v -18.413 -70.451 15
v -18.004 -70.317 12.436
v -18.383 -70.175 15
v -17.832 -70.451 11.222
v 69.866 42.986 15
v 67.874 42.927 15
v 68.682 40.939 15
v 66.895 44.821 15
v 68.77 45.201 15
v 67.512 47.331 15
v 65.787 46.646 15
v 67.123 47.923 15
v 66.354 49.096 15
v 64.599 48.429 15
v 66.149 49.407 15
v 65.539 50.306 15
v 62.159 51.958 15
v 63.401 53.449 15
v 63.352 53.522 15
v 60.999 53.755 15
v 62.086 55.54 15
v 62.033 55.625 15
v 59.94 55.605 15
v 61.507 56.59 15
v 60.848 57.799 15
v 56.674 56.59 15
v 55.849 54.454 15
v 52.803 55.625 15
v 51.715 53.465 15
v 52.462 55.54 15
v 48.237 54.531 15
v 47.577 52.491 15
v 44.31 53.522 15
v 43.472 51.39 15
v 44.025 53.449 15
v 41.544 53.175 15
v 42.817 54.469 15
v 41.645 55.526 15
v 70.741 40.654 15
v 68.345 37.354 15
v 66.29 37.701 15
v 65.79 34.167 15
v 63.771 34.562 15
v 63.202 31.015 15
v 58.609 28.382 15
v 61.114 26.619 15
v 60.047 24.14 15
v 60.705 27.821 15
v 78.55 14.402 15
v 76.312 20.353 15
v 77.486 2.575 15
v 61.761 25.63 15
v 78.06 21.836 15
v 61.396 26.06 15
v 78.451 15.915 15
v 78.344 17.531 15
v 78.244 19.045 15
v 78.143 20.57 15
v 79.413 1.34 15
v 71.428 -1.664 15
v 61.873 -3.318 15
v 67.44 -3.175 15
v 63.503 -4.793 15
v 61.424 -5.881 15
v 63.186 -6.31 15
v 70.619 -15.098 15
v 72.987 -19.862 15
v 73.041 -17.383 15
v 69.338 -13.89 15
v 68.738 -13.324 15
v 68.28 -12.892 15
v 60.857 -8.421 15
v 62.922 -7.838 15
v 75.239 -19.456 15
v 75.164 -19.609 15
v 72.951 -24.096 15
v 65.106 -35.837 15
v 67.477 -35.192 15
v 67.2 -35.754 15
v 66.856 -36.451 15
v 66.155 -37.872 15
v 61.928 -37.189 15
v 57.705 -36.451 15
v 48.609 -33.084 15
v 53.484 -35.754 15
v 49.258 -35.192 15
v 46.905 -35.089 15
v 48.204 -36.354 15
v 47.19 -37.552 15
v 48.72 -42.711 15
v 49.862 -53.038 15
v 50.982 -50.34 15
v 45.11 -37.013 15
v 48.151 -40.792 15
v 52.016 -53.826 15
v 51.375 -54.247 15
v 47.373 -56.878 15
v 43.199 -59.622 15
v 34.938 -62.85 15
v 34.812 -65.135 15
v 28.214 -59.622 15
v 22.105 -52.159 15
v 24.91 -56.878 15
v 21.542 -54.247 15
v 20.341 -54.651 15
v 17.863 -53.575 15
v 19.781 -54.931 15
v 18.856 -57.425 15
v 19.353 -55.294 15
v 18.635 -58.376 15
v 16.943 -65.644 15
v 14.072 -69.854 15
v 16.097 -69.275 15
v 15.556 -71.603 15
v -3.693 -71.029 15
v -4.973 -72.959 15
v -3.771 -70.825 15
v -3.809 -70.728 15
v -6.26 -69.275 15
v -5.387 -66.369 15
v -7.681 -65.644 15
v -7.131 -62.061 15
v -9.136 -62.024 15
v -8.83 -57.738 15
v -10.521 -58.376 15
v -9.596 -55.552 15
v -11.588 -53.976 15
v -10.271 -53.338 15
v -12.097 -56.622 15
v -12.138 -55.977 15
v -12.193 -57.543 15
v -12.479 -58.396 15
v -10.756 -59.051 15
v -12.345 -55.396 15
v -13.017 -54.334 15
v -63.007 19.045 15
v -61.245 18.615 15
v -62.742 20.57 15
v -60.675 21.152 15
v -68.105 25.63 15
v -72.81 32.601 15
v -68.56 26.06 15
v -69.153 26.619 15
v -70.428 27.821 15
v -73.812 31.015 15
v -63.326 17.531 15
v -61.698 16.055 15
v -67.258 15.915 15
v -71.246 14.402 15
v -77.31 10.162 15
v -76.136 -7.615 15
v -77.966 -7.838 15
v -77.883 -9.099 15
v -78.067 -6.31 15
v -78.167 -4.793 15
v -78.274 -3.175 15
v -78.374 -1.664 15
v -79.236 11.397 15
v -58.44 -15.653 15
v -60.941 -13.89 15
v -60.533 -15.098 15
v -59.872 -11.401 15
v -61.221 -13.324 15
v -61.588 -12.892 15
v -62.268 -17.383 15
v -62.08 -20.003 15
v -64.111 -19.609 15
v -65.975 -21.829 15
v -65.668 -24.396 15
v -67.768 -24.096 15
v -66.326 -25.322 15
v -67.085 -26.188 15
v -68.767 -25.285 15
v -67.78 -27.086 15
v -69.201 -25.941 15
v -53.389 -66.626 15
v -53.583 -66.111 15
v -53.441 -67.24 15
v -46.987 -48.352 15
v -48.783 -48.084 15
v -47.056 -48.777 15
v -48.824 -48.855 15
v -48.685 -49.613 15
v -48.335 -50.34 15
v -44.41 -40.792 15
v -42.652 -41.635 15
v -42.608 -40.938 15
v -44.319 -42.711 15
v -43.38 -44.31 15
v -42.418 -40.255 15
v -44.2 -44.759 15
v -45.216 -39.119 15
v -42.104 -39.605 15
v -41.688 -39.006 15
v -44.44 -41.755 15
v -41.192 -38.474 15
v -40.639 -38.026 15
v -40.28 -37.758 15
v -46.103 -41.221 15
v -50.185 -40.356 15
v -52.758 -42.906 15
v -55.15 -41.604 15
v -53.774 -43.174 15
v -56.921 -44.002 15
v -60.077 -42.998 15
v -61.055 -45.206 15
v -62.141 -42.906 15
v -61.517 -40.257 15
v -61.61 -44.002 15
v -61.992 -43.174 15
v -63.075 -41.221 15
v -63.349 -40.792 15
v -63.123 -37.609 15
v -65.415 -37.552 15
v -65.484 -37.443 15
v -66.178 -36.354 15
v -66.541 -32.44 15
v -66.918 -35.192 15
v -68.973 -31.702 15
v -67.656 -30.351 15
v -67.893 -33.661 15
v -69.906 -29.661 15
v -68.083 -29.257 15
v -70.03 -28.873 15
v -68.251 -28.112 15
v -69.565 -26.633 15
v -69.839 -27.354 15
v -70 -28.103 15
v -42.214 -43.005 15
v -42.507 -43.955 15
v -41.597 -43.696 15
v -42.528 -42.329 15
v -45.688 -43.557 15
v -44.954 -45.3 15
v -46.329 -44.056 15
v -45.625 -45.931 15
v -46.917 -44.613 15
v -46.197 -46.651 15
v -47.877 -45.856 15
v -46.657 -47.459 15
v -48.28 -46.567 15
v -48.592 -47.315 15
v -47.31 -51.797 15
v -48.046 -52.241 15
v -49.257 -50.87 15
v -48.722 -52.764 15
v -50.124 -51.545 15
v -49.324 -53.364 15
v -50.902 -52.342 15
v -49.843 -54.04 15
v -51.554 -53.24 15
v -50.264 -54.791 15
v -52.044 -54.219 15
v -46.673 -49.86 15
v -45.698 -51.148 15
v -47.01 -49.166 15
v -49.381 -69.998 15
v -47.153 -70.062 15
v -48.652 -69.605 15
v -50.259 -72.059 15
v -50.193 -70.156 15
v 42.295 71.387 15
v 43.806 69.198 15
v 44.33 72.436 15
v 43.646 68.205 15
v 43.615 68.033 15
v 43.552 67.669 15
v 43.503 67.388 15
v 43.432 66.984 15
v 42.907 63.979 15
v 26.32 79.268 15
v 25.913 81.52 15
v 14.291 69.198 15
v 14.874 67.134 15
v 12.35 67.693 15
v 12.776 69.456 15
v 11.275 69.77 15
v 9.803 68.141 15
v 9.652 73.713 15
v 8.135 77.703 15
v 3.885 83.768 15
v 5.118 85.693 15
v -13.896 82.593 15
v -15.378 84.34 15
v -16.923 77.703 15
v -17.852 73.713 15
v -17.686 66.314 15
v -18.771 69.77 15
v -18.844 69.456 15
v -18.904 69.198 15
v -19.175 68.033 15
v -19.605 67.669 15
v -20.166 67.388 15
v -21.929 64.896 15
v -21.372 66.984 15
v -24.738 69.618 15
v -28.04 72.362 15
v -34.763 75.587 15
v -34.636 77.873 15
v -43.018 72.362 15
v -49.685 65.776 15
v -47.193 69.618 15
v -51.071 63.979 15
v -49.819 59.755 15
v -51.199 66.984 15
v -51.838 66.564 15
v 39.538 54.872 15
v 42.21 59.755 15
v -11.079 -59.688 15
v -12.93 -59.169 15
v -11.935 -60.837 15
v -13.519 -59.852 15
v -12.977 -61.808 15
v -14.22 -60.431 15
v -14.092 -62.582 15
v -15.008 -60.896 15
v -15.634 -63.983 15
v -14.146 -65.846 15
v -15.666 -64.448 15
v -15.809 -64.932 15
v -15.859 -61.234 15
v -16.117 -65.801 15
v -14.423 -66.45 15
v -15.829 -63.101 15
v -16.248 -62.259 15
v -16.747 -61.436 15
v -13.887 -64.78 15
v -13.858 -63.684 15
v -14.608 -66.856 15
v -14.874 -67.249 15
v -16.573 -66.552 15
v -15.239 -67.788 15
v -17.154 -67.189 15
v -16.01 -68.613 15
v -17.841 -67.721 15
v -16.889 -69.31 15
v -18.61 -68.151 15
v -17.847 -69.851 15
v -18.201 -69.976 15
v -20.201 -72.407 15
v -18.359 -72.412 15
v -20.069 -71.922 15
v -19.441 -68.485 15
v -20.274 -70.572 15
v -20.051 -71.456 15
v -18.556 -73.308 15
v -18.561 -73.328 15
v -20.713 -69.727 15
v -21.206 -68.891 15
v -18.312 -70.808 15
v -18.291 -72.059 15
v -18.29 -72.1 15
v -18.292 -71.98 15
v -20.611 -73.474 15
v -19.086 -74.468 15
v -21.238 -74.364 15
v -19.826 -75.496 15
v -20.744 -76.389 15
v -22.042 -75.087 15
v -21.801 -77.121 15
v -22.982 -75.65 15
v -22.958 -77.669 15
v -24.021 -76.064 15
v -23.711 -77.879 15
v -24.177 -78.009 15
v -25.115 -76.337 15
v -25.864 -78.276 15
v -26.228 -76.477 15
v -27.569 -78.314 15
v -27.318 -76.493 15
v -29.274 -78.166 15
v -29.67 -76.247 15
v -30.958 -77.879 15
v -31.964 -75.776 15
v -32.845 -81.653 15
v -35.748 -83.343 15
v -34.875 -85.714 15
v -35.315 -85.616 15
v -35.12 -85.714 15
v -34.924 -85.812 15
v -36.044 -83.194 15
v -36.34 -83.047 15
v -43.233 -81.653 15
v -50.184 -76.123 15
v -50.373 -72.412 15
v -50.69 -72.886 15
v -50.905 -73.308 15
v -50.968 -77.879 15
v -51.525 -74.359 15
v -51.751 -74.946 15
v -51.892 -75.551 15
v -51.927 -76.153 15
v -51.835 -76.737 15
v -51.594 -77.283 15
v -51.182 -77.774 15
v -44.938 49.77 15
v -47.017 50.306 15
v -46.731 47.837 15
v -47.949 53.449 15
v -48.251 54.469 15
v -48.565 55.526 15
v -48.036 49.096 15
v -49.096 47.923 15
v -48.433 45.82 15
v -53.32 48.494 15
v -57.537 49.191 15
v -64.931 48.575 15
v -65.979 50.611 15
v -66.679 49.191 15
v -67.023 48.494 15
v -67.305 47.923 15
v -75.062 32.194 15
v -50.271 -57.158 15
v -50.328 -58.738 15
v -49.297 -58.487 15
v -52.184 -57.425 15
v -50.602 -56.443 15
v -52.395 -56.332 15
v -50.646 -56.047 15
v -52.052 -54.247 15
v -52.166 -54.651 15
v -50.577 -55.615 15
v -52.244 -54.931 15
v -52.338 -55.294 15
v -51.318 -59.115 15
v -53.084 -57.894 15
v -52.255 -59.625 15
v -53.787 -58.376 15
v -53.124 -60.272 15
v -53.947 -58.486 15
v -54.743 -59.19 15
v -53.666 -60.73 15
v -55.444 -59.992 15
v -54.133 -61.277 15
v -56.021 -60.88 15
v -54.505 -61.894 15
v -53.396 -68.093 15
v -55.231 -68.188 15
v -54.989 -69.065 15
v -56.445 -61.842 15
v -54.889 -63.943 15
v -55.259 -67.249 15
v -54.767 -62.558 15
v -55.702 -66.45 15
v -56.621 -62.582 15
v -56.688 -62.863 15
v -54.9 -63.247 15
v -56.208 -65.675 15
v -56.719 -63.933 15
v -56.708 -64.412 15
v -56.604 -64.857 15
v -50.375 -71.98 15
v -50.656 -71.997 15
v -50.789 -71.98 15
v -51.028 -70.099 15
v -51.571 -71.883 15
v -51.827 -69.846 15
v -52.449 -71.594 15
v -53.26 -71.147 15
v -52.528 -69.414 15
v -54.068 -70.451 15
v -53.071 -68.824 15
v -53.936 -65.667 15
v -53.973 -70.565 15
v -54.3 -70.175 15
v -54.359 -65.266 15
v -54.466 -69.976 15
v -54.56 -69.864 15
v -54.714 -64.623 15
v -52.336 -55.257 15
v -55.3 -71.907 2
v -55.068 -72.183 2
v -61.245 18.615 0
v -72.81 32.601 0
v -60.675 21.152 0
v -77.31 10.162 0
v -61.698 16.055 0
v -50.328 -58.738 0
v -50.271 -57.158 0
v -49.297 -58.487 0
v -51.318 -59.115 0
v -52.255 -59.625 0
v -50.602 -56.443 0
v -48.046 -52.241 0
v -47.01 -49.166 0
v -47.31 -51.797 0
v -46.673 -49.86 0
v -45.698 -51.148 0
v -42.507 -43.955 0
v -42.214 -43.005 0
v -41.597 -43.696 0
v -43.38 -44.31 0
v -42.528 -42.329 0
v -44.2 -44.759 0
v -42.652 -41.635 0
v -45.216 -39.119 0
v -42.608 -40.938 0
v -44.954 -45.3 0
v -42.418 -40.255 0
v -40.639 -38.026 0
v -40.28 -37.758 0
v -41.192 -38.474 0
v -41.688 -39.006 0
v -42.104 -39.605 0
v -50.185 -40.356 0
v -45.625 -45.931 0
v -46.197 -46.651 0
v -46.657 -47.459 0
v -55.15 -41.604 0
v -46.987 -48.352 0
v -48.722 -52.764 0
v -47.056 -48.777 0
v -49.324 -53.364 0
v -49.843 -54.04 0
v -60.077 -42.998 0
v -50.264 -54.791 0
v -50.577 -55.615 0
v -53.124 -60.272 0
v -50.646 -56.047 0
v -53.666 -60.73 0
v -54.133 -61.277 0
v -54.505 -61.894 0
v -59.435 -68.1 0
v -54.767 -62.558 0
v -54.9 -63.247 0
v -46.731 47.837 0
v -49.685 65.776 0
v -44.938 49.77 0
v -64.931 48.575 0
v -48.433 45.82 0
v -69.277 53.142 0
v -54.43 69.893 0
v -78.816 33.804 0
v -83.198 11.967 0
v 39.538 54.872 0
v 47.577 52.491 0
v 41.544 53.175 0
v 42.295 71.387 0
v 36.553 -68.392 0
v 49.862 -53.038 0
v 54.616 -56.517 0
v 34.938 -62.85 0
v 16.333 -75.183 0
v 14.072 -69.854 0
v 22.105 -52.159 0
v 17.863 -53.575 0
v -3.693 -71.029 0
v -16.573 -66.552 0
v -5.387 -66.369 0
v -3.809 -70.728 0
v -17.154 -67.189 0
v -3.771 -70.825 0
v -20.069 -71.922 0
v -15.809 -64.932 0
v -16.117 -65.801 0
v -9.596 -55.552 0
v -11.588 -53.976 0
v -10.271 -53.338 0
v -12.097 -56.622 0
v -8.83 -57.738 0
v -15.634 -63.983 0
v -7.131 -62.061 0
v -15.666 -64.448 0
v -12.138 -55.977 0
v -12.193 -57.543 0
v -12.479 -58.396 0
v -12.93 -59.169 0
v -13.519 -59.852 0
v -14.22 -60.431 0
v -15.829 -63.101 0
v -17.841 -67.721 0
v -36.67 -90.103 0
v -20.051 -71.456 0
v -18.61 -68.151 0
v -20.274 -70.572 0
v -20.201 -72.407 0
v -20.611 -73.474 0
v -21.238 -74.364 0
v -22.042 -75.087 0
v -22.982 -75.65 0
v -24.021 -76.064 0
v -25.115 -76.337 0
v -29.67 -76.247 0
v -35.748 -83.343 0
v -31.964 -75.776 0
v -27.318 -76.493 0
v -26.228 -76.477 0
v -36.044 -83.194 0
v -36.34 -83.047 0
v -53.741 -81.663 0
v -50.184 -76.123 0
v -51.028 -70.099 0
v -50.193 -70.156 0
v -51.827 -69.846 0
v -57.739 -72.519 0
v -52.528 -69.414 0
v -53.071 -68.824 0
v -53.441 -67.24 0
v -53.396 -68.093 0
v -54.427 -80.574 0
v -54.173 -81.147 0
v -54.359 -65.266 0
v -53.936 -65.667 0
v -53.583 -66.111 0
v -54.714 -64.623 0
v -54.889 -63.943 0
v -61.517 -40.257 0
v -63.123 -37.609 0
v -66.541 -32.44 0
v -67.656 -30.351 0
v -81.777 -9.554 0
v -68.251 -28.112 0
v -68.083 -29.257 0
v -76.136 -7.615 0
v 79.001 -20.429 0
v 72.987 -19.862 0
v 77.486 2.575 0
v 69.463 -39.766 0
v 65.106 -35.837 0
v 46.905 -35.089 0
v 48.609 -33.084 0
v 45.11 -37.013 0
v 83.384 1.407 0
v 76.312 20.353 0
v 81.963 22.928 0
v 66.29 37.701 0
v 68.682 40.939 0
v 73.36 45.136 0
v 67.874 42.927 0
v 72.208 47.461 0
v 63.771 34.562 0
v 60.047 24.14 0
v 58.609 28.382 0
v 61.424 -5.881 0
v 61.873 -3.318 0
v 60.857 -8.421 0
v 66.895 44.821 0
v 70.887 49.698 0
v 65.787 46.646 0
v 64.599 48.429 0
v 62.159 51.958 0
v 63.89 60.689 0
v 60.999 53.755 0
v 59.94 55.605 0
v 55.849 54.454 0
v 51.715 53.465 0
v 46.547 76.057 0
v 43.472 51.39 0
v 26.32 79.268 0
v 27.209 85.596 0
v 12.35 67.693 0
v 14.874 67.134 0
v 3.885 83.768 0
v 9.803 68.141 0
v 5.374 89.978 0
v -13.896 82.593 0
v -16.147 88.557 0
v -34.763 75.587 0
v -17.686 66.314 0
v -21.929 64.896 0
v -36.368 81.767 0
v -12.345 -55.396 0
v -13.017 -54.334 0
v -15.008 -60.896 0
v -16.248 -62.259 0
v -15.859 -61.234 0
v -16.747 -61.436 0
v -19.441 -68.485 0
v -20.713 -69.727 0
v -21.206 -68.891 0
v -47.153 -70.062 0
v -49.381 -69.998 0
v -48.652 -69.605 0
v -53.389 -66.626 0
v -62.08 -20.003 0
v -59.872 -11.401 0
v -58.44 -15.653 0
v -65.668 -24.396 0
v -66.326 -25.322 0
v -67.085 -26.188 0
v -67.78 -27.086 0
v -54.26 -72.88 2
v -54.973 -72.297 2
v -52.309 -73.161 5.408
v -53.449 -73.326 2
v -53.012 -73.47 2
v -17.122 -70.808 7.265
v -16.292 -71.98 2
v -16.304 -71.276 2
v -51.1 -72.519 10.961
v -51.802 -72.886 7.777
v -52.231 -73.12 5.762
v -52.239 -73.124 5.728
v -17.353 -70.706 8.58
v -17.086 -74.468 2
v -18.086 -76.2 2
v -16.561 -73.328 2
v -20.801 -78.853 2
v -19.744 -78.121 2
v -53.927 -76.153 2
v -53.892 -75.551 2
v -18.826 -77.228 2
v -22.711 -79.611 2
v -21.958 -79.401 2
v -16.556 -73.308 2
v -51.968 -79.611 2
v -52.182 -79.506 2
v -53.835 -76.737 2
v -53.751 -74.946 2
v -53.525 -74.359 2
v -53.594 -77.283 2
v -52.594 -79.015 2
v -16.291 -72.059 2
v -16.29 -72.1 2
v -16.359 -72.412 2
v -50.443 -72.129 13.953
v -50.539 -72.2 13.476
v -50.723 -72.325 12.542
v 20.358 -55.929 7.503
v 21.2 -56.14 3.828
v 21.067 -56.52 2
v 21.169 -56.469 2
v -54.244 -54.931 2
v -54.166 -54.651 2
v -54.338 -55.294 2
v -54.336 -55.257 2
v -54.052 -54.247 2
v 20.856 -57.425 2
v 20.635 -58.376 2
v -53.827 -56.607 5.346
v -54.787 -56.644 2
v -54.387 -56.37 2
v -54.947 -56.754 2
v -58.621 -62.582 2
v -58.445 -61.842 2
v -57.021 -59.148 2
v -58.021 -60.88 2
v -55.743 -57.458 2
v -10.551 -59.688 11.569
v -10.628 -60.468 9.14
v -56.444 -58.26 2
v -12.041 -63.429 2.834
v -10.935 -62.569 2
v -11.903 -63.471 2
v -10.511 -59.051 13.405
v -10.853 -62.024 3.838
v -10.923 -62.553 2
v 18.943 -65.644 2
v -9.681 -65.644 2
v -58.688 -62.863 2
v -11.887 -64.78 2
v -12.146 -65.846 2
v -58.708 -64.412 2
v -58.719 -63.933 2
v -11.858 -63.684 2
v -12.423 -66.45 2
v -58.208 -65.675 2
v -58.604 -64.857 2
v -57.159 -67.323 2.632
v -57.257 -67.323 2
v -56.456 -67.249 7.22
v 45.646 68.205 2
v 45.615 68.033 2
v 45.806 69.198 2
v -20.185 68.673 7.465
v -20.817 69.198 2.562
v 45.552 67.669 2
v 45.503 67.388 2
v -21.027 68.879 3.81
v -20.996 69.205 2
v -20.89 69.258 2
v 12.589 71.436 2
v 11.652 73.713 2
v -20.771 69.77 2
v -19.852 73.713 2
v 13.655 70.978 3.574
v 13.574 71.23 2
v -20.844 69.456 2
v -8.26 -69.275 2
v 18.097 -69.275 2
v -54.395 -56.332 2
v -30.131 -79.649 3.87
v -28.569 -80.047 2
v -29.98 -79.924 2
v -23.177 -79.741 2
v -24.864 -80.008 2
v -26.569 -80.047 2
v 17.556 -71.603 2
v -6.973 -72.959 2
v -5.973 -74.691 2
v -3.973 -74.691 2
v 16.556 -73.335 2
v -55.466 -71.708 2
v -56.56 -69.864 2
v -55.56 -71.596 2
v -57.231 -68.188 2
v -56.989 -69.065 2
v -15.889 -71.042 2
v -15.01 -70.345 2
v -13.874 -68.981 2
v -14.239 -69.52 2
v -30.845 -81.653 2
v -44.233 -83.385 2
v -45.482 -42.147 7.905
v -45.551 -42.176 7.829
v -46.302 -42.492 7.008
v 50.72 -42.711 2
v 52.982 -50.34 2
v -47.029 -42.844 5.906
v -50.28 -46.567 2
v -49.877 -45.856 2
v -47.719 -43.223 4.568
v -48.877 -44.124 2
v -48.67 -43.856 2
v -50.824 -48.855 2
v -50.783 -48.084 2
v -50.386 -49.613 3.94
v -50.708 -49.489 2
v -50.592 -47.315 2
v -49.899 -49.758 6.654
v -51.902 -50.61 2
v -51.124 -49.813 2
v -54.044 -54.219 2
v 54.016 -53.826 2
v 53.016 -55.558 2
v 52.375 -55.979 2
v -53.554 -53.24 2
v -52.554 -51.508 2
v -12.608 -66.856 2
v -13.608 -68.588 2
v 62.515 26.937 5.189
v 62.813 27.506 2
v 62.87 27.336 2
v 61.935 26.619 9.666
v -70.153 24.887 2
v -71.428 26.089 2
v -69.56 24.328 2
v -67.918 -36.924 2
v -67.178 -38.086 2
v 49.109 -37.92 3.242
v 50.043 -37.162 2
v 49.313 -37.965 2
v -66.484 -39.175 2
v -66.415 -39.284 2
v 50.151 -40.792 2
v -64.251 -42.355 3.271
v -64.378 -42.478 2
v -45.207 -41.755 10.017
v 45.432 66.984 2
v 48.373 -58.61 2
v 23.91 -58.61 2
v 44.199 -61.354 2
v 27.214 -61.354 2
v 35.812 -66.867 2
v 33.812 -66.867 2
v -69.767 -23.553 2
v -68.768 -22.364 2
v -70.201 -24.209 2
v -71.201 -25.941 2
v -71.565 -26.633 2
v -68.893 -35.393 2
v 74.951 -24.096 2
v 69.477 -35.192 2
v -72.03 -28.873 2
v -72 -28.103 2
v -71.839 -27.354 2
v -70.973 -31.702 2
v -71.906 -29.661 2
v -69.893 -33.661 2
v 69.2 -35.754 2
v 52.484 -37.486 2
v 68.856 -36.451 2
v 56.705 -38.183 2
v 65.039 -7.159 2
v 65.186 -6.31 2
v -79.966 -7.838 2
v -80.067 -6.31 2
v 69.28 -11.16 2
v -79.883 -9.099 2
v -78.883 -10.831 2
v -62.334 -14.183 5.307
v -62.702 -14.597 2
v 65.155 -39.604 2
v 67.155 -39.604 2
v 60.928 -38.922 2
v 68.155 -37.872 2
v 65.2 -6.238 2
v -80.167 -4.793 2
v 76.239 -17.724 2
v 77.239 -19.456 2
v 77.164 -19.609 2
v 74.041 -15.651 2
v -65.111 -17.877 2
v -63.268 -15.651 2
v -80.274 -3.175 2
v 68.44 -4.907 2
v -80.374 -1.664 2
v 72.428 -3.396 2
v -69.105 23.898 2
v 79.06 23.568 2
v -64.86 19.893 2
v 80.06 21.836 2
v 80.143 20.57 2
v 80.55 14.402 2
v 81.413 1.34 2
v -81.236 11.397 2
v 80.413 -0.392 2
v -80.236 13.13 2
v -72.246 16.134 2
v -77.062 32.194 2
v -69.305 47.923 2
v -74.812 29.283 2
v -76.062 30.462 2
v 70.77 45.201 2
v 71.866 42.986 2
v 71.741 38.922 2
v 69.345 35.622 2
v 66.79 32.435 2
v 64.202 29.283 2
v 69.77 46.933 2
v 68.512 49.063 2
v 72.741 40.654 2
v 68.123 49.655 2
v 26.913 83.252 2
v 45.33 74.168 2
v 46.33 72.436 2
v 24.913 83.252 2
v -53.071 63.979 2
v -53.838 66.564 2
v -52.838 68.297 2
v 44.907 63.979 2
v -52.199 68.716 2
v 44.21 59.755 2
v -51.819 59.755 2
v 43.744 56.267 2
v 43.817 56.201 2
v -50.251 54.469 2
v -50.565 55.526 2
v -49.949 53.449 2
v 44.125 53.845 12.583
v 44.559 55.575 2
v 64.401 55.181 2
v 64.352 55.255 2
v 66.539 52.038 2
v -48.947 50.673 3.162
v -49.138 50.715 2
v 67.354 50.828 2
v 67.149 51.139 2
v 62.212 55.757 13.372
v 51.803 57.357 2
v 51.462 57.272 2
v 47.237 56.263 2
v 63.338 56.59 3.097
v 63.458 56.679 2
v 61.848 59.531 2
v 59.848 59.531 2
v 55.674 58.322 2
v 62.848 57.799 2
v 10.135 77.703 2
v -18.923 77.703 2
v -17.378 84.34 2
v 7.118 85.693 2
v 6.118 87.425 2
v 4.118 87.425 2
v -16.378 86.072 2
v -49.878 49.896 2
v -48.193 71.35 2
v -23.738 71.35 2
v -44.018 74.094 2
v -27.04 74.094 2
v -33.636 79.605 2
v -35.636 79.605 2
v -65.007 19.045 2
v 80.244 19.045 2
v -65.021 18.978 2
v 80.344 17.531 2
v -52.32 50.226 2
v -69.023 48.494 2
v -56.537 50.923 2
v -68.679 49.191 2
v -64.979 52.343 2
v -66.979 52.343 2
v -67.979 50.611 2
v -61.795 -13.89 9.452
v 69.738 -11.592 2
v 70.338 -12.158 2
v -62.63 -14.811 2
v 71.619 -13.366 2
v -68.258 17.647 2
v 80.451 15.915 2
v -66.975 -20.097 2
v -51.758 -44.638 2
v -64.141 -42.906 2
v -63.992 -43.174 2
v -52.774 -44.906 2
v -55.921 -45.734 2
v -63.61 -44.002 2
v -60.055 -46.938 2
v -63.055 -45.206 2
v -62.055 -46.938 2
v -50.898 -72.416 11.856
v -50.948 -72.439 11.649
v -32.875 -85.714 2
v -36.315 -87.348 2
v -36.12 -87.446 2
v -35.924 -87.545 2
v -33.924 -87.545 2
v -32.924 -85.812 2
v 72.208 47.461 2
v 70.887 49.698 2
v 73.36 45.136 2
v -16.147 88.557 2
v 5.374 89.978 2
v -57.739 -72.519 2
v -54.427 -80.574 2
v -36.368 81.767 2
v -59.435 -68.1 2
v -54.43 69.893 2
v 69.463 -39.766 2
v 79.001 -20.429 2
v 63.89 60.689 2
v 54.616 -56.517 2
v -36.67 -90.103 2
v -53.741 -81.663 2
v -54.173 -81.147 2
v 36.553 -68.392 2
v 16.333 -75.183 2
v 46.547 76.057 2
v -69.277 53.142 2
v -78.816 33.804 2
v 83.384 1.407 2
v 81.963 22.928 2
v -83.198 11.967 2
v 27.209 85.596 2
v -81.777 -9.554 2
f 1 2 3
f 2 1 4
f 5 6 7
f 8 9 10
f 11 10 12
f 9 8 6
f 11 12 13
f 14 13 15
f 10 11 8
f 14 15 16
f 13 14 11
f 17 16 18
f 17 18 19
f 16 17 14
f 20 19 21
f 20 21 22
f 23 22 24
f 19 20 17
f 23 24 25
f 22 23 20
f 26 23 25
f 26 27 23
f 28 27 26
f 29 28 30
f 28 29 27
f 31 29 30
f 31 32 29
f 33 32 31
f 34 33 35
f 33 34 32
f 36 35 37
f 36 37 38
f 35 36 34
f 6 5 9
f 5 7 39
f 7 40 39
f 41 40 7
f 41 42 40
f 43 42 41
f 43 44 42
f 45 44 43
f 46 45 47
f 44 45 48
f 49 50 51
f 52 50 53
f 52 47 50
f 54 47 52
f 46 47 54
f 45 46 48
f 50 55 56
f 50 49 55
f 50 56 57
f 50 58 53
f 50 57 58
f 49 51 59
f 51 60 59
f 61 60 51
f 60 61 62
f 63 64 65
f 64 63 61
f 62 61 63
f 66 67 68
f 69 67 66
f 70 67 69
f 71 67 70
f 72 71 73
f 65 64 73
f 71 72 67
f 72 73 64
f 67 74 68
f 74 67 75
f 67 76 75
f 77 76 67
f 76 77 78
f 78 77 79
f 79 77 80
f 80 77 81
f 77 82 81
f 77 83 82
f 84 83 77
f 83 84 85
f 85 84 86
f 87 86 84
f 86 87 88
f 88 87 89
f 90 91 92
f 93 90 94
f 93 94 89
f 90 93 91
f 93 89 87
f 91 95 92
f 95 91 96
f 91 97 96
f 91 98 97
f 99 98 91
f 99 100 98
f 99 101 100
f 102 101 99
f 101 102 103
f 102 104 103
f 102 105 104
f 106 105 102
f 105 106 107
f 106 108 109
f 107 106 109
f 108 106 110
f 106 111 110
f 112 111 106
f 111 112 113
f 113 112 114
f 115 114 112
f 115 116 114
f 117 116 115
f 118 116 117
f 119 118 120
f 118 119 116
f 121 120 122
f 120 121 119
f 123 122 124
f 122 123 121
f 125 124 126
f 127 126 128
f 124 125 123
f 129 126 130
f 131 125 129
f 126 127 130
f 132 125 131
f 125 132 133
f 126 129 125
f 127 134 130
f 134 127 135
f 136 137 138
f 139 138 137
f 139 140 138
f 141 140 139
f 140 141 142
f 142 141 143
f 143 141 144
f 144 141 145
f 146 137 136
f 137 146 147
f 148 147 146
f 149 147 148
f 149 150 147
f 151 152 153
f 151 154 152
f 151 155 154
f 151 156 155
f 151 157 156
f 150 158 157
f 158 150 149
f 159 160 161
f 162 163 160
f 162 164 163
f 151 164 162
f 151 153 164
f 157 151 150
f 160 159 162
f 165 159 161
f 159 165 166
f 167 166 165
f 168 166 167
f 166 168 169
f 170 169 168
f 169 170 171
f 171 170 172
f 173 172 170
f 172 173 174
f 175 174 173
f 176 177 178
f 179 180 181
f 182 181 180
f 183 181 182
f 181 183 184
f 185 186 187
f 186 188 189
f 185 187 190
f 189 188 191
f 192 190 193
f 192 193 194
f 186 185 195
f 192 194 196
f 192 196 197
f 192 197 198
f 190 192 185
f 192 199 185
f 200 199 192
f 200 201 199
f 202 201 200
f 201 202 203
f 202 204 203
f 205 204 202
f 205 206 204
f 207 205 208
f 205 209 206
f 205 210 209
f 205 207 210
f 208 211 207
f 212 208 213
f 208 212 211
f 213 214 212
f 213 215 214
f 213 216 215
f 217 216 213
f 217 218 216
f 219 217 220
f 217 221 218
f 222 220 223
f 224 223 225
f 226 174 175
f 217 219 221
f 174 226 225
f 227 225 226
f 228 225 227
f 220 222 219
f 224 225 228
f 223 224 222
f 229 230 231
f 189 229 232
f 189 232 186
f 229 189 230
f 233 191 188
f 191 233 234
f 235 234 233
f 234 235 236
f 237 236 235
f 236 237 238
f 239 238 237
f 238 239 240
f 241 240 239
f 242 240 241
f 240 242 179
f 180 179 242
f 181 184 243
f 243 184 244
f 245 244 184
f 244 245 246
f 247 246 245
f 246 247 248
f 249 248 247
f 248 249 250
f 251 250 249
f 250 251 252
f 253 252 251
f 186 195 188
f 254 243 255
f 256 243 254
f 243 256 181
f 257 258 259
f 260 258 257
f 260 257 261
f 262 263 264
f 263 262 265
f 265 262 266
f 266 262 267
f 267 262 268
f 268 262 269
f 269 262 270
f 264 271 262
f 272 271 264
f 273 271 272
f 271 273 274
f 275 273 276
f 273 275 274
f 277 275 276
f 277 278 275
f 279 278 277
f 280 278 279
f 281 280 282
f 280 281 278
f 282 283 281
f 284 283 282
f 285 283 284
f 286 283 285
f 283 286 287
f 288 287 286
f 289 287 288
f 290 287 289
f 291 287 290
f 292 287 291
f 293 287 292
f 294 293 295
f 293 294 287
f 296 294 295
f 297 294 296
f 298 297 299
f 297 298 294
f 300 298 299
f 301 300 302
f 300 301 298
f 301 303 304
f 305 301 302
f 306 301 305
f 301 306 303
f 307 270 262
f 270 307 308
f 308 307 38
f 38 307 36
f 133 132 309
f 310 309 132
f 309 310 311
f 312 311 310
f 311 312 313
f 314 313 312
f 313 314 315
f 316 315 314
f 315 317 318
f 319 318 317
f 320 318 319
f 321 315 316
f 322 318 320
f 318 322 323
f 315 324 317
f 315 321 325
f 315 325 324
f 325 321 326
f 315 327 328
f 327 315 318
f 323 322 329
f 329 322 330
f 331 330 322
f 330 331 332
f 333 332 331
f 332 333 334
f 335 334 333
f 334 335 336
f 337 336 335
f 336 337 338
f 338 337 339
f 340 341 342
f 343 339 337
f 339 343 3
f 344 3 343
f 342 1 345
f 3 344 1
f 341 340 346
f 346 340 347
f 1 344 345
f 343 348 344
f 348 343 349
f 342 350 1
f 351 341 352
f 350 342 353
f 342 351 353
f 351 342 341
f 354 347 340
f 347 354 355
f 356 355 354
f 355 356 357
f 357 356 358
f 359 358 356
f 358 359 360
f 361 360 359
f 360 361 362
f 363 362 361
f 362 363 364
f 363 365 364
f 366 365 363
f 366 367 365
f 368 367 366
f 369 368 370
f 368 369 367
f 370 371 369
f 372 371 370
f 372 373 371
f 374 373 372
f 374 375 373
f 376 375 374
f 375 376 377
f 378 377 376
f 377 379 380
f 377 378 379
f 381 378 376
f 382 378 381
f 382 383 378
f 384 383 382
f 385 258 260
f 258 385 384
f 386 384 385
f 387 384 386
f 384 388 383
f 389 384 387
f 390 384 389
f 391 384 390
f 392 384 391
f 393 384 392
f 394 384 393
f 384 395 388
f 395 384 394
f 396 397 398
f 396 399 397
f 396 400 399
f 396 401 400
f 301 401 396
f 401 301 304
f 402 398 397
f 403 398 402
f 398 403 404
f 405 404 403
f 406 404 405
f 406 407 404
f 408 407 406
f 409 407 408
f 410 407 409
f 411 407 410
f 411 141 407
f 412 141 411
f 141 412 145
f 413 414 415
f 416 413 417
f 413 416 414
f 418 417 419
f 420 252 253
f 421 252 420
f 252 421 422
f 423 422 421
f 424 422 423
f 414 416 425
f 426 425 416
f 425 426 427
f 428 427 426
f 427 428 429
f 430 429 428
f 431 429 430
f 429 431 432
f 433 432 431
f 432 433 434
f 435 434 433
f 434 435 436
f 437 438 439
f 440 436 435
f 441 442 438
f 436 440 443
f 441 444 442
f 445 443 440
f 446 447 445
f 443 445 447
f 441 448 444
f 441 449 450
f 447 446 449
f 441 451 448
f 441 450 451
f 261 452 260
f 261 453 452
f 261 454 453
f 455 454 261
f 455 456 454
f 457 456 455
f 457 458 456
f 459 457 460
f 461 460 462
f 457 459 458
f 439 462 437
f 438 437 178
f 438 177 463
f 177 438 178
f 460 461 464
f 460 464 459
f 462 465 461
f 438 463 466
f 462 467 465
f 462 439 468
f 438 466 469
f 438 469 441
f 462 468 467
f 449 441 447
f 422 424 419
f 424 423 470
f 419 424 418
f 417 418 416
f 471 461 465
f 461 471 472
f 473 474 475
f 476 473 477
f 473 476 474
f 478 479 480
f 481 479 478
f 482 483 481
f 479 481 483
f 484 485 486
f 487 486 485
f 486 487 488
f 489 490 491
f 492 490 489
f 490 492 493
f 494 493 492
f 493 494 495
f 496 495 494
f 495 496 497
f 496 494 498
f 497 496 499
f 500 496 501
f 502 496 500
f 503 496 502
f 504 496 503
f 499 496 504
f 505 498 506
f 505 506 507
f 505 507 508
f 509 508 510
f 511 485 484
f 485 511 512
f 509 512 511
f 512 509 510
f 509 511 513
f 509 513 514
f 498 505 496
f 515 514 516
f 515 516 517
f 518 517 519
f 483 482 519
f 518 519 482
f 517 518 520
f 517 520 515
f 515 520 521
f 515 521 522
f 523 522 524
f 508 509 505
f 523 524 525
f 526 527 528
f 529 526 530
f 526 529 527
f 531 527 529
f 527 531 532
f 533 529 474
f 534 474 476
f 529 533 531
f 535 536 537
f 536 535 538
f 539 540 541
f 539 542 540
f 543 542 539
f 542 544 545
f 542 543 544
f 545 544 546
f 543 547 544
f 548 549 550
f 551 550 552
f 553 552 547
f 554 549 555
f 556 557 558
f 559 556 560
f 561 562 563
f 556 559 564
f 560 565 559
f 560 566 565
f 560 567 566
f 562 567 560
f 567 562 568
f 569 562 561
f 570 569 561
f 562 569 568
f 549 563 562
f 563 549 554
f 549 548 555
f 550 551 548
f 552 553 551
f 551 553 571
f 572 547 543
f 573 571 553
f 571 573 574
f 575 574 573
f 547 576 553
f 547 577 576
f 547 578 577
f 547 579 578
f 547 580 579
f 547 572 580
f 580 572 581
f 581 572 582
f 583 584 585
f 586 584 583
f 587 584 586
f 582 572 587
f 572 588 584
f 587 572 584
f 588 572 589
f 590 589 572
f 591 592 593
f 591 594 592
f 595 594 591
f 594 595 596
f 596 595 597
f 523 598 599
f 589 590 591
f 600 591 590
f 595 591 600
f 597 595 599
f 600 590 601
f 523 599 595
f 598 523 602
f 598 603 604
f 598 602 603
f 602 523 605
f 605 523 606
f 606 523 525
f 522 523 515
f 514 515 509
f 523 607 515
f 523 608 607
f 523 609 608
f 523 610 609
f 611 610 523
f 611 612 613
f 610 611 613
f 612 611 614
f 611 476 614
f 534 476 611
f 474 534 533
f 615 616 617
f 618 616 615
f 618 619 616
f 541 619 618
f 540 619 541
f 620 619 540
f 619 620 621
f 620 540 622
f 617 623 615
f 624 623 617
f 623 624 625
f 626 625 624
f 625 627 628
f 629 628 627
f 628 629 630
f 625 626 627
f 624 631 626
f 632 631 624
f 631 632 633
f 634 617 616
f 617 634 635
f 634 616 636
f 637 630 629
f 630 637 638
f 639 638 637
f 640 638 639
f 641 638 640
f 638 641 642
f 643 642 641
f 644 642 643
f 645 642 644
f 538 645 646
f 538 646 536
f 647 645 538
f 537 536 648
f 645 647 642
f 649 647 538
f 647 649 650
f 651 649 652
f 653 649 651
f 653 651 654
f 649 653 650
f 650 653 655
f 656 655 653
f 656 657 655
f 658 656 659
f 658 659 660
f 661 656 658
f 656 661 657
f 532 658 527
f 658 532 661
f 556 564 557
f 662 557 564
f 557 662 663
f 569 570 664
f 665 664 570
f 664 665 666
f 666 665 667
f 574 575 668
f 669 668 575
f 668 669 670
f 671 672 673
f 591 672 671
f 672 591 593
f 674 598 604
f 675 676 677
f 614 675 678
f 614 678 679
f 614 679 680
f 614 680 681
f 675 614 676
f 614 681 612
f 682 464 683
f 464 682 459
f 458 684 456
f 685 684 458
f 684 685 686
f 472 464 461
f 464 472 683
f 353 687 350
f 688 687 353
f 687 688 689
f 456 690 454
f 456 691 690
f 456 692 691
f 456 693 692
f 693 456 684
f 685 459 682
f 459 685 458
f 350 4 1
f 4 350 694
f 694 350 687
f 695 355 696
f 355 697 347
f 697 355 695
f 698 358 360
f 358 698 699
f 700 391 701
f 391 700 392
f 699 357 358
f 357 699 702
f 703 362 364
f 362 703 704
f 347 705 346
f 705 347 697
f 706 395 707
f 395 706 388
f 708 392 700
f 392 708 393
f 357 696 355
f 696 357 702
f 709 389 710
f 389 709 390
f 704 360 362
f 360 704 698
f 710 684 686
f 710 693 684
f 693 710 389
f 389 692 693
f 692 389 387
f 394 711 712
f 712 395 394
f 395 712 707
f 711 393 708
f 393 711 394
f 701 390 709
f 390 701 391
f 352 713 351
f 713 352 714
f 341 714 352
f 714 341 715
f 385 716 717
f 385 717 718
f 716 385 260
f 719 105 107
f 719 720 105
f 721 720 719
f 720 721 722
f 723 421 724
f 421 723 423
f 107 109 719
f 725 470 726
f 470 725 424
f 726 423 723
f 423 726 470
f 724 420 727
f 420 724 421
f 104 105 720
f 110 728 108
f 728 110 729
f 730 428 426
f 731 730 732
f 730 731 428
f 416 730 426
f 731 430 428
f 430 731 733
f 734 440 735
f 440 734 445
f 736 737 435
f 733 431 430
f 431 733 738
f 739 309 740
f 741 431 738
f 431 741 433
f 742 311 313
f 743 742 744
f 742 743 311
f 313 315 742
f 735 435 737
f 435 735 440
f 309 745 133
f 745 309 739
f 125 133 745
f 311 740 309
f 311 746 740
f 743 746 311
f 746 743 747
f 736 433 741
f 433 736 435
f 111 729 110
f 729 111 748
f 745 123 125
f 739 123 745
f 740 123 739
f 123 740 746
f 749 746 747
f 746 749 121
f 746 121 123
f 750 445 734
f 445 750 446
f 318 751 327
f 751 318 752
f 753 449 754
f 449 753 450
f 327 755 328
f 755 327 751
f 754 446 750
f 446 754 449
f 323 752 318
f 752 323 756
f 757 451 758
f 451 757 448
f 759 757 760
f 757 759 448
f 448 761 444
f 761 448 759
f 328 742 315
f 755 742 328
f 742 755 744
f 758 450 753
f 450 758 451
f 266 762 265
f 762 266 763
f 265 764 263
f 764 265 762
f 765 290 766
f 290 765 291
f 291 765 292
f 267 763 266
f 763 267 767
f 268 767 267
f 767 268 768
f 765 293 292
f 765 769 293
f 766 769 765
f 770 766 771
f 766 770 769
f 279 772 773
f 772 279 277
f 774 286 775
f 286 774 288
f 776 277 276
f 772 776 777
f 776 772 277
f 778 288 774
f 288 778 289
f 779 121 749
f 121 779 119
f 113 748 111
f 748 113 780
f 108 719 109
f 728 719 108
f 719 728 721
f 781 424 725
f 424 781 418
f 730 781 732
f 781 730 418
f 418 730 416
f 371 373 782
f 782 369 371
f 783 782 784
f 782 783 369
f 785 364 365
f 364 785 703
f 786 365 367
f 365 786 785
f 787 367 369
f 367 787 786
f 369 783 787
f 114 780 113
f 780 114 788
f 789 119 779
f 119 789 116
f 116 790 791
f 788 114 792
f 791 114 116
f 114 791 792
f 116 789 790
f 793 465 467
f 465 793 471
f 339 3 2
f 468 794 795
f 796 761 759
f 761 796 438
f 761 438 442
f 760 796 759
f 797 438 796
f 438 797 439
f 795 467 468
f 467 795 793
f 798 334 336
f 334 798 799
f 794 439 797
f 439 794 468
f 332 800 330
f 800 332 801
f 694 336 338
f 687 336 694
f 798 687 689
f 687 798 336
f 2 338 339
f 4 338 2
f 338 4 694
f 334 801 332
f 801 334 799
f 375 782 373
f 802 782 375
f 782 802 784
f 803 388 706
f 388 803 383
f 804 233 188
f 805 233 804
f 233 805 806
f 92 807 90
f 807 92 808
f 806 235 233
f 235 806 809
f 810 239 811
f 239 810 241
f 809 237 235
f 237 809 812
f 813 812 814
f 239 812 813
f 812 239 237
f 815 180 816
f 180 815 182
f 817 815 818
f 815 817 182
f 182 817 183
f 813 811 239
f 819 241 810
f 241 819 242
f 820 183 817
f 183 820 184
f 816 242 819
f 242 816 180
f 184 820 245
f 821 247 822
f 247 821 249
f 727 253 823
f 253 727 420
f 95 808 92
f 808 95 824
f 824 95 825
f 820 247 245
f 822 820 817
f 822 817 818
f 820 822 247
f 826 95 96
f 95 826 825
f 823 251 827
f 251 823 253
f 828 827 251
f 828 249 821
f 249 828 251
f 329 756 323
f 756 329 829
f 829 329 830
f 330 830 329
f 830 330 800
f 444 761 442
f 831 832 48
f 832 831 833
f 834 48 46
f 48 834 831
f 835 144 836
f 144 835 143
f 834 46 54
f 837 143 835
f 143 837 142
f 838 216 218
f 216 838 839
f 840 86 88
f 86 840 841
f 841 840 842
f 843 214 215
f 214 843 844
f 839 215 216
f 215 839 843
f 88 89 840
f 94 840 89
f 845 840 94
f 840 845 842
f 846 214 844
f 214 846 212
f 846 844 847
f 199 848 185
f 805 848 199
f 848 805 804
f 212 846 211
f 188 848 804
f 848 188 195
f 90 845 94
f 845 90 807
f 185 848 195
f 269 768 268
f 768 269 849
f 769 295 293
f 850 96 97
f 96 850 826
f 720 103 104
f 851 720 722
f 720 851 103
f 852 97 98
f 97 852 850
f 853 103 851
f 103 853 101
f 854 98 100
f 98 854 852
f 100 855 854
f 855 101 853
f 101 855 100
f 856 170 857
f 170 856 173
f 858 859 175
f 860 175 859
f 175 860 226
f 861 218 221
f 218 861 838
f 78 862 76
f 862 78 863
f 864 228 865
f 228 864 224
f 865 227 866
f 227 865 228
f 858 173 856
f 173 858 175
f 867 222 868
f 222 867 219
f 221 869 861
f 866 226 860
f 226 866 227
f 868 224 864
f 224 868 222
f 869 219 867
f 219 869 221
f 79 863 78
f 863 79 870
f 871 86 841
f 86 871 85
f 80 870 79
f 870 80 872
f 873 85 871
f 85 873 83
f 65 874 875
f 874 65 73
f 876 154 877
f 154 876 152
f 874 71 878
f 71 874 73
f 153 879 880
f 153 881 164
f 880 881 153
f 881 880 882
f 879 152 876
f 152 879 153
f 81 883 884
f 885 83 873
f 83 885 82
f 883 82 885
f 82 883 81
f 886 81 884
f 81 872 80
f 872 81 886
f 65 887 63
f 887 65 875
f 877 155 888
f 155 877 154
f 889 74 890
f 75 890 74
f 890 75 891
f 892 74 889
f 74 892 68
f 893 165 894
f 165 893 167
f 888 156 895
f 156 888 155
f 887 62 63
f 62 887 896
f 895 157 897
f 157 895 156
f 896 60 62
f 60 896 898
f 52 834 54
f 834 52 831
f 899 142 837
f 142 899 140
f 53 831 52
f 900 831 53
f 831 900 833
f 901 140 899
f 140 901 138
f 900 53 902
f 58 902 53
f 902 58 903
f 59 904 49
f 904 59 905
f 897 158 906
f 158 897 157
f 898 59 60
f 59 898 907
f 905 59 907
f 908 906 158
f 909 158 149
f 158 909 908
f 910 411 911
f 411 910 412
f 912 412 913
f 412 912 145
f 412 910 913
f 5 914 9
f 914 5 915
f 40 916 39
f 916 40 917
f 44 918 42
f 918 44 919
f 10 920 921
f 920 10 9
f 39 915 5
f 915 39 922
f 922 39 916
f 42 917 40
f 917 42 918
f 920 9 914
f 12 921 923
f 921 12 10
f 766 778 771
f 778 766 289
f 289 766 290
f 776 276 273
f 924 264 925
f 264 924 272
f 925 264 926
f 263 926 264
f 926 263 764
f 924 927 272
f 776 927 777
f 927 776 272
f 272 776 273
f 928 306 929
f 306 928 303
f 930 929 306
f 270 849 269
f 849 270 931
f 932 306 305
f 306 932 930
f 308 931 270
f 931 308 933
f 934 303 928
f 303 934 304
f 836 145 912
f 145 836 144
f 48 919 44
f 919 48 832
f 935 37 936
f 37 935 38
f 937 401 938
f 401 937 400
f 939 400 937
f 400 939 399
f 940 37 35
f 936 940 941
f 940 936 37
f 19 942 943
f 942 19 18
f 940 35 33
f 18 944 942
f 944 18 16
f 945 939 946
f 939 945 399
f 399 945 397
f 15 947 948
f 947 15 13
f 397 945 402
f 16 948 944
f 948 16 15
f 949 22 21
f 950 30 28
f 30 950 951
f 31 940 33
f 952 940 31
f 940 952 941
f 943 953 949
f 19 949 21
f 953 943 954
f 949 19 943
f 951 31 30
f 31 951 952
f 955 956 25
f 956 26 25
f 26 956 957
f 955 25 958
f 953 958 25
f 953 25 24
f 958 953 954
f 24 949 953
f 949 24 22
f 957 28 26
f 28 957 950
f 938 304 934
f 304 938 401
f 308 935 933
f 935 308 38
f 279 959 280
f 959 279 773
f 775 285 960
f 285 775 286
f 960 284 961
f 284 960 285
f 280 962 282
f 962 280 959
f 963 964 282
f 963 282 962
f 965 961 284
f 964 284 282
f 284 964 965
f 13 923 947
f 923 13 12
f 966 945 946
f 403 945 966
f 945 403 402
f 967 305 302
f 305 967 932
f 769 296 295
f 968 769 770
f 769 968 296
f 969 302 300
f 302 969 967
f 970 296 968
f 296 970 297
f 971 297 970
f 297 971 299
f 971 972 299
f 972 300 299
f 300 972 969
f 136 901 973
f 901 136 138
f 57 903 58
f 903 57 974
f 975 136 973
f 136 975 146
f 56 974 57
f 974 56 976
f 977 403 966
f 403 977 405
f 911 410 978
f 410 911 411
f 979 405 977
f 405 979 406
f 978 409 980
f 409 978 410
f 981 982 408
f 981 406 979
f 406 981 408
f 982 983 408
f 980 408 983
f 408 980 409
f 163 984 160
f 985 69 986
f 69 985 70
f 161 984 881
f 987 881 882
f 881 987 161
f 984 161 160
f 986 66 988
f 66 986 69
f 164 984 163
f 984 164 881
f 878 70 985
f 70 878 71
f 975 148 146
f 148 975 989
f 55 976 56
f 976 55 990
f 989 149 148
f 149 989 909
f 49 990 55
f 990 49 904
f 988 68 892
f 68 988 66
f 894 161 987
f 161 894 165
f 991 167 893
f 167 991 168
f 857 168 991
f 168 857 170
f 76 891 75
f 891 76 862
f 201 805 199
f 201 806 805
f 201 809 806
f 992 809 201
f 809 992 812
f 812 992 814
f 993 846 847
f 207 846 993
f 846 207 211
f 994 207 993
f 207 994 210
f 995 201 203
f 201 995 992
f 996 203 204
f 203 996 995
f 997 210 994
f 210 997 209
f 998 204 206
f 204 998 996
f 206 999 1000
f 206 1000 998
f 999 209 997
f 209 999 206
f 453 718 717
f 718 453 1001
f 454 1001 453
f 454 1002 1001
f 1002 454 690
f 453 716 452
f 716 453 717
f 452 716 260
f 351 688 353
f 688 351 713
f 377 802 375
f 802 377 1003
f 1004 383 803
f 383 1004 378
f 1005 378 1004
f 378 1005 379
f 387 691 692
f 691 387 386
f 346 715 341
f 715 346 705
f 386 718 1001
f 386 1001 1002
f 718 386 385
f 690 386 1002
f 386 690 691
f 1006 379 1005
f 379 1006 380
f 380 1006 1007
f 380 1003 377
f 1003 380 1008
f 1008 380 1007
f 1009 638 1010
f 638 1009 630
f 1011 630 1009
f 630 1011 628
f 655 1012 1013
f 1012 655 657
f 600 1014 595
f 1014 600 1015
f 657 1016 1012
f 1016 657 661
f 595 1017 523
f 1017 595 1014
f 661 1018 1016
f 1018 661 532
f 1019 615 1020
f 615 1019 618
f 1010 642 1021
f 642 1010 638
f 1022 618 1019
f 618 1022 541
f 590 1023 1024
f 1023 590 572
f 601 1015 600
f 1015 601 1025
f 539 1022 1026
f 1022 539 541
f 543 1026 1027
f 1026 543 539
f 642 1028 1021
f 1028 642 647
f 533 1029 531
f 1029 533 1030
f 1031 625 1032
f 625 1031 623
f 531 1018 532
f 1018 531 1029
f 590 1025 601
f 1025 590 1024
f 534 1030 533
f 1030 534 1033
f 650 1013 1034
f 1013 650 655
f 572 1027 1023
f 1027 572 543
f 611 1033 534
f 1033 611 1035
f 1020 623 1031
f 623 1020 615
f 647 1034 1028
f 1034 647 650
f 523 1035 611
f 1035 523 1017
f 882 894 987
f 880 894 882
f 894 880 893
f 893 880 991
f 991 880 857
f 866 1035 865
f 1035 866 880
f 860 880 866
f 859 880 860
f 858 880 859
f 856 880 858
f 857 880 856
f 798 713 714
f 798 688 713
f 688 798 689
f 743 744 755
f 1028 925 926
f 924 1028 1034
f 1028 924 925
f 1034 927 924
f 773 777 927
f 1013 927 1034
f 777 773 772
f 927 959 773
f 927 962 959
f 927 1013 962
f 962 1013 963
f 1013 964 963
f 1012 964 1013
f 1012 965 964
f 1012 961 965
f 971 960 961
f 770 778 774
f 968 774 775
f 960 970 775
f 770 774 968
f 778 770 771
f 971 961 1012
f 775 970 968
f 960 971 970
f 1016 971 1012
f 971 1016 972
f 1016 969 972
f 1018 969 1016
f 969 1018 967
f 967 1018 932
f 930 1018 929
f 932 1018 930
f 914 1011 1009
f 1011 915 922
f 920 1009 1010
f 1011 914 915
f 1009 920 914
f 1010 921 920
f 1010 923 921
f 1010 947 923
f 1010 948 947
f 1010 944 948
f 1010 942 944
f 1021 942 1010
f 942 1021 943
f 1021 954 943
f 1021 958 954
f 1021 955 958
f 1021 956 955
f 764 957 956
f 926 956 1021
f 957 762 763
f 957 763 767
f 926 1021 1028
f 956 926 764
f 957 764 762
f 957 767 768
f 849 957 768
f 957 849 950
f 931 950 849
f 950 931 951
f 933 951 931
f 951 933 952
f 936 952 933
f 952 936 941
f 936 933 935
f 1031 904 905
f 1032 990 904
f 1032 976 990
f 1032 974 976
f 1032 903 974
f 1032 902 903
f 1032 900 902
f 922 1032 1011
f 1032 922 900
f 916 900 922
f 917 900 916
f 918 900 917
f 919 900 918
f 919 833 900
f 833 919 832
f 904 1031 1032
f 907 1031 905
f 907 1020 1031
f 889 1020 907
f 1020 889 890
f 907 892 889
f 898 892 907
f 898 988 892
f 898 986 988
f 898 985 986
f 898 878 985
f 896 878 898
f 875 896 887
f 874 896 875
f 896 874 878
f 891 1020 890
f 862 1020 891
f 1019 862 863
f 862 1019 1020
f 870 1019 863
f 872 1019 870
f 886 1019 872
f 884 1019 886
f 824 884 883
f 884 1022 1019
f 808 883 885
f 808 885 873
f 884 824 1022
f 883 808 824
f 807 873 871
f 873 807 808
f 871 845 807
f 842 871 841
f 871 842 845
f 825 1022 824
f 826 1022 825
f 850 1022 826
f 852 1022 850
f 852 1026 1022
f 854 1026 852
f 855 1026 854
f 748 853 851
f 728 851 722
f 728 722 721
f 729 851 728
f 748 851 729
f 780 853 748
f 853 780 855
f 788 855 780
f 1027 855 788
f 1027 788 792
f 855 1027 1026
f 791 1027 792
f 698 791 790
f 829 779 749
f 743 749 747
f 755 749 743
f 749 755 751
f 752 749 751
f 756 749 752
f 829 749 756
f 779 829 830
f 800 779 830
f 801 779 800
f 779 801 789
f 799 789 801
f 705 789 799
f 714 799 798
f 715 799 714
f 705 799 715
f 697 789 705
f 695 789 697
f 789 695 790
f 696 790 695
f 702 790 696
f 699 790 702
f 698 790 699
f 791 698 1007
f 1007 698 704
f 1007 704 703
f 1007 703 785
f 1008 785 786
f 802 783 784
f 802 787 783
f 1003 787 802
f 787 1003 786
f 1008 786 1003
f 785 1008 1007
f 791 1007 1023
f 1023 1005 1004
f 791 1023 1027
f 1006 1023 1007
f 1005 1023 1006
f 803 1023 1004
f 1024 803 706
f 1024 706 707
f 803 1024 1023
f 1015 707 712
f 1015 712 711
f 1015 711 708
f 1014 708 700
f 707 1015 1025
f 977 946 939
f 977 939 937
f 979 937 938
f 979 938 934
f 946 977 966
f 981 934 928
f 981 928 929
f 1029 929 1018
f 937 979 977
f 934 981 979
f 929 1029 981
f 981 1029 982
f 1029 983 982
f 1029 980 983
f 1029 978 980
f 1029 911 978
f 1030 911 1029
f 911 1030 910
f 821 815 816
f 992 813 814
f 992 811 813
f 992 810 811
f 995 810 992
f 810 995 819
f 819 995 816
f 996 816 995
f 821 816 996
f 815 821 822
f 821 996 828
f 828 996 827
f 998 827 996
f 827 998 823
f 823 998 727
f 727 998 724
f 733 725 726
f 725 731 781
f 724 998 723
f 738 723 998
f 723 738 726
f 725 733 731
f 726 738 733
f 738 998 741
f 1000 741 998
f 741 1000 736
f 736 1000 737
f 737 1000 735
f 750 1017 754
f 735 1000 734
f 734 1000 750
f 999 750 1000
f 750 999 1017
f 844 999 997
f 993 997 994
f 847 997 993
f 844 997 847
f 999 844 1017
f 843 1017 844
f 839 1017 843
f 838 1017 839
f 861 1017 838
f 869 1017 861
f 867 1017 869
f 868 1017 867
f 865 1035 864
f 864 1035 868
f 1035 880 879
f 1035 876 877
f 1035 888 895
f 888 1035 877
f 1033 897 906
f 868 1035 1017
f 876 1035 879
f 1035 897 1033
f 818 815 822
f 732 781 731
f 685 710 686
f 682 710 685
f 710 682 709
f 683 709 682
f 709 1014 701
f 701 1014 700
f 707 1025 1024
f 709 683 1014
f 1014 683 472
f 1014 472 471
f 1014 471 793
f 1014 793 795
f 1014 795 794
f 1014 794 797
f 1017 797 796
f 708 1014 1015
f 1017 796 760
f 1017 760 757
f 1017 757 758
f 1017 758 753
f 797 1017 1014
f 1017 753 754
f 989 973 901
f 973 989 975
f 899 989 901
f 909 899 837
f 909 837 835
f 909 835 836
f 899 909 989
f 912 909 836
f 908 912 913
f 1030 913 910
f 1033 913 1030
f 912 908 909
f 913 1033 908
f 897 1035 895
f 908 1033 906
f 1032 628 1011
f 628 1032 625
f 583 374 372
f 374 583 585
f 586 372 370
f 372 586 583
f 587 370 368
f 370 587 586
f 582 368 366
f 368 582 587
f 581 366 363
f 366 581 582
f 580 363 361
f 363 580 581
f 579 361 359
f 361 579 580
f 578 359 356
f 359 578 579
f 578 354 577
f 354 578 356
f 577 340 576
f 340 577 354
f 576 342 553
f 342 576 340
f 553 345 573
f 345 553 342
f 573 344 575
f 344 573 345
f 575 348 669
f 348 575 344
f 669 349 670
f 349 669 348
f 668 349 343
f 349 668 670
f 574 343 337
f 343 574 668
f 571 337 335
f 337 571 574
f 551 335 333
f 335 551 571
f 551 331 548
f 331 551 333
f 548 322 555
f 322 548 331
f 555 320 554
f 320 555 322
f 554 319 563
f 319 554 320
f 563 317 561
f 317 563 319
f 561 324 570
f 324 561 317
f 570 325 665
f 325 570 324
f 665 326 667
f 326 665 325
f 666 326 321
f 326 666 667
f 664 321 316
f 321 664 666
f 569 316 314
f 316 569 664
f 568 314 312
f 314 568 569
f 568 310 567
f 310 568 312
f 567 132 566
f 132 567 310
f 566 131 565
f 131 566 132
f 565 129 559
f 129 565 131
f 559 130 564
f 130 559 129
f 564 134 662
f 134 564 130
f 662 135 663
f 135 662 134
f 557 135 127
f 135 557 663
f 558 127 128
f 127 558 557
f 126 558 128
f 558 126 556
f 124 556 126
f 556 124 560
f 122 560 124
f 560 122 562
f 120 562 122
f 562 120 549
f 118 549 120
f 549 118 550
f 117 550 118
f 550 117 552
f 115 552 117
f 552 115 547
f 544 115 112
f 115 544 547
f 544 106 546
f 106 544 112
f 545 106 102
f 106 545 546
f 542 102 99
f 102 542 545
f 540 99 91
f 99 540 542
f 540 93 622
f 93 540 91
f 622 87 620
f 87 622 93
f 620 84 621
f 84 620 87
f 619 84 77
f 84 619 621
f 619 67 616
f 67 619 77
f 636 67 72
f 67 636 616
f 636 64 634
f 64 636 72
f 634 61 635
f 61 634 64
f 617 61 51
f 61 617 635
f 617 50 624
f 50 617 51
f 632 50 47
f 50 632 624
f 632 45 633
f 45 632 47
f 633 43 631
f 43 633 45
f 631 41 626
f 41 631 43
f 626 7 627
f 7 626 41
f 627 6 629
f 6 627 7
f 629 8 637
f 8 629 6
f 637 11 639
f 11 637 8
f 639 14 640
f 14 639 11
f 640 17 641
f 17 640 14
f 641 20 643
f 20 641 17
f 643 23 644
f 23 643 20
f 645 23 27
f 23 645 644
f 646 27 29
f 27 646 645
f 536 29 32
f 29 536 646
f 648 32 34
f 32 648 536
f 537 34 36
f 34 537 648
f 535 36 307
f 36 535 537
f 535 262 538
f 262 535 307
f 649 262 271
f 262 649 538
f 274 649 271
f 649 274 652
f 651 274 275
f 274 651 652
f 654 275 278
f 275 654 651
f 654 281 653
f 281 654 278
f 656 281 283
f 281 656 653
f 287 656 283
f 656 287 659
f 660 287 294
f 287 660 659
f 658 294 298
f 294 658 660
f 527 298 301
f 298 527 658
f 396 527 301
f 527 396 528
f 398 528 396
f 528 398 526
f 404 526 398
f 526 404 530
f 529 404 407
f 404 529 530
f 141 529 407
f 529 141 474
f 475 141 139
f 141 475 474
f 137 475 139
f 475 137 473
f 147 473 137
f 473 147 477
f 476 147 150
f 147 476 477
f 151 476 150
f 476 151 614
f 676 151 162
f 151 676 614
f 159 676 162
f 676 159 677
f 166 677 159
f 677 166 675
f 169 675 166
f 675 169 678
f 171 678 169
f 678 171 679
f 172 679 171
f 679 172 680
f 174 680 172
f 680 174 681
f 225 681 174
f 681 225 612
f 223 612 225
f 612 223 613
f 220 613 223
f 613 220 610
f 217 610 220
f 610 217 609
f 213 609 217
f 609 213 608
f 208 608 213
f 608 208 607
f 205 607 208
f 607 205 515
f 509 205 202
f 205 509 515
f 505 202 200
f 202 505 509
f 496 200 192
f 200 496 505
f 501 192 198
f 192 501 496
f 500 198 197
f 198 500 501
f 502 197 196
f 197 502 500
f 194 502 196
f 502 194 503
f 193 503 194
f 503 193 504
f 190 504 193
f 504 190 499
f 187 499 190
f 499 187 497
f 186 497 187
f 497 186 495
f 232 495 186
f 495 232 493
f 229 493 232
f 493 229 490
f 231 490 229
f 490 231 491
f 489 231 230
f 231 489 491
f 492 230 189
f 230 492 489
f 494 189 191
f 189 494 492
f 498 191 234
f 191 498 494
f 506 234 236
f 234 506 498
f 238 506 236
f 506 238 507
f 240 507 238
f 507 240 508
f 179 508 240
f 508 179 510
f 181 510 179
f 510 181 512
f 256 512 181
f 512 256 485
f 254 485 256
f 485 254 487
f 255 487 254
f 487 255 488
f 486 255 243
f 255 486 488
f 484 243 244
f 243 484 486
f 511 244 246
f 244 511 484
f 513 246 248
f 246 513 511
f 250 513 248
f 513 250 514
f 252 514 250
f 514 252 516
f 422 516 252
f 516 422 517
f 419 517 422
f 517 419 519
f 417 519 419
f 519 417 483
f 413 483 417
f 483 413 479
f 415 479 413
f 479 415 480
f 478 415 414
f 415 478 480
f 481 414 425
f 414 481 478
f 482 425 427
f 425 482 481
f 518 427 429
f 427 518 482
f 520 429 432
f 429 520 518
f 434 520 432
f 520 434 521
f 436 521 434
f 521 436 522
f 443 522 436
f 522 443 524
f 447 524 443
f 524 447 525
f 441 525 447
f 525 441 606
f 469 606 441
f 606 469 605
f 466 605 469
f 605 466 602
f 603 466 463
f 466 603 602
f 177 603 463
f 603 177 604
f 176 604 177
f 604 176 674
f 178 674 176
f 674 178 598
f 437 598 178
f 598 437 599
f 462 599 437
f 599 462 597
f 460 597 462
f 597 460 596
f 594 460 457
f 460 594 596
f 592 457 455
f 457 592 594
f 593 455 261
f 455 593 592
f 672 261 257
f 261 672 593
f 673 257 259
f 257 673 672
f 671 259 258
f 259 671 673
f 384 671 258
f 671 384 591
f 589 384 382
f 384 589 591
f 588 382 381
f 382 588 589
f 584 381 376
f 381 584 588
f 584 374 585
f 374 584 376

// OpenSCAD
cutter();

base_height = 2;
cutter_height = 13;

module cutter(){
    difference(){
        union(){
            hull(){
                scale([1.05,1.05,1]) linear_extrude(height=base_height){
                    import("nova-labs-cutter.dxf", layer = "outside_edge");
                }
            }
            minkowski(){
                linear_extrude(height=base_height){
                    import("nova-labs-cutter.dxf", layer = "outside_edge");
                }
                cylinder(r1=2, r2=0, h=cutter_height, $fn=6);
            }
        }
        
        translate([0,0,-.1]) linear_extrude(height=base_height+cutter_height+1){
            import("nova-labs-cutter.dxf", layer = "inside_edge");
        }
    }
}
